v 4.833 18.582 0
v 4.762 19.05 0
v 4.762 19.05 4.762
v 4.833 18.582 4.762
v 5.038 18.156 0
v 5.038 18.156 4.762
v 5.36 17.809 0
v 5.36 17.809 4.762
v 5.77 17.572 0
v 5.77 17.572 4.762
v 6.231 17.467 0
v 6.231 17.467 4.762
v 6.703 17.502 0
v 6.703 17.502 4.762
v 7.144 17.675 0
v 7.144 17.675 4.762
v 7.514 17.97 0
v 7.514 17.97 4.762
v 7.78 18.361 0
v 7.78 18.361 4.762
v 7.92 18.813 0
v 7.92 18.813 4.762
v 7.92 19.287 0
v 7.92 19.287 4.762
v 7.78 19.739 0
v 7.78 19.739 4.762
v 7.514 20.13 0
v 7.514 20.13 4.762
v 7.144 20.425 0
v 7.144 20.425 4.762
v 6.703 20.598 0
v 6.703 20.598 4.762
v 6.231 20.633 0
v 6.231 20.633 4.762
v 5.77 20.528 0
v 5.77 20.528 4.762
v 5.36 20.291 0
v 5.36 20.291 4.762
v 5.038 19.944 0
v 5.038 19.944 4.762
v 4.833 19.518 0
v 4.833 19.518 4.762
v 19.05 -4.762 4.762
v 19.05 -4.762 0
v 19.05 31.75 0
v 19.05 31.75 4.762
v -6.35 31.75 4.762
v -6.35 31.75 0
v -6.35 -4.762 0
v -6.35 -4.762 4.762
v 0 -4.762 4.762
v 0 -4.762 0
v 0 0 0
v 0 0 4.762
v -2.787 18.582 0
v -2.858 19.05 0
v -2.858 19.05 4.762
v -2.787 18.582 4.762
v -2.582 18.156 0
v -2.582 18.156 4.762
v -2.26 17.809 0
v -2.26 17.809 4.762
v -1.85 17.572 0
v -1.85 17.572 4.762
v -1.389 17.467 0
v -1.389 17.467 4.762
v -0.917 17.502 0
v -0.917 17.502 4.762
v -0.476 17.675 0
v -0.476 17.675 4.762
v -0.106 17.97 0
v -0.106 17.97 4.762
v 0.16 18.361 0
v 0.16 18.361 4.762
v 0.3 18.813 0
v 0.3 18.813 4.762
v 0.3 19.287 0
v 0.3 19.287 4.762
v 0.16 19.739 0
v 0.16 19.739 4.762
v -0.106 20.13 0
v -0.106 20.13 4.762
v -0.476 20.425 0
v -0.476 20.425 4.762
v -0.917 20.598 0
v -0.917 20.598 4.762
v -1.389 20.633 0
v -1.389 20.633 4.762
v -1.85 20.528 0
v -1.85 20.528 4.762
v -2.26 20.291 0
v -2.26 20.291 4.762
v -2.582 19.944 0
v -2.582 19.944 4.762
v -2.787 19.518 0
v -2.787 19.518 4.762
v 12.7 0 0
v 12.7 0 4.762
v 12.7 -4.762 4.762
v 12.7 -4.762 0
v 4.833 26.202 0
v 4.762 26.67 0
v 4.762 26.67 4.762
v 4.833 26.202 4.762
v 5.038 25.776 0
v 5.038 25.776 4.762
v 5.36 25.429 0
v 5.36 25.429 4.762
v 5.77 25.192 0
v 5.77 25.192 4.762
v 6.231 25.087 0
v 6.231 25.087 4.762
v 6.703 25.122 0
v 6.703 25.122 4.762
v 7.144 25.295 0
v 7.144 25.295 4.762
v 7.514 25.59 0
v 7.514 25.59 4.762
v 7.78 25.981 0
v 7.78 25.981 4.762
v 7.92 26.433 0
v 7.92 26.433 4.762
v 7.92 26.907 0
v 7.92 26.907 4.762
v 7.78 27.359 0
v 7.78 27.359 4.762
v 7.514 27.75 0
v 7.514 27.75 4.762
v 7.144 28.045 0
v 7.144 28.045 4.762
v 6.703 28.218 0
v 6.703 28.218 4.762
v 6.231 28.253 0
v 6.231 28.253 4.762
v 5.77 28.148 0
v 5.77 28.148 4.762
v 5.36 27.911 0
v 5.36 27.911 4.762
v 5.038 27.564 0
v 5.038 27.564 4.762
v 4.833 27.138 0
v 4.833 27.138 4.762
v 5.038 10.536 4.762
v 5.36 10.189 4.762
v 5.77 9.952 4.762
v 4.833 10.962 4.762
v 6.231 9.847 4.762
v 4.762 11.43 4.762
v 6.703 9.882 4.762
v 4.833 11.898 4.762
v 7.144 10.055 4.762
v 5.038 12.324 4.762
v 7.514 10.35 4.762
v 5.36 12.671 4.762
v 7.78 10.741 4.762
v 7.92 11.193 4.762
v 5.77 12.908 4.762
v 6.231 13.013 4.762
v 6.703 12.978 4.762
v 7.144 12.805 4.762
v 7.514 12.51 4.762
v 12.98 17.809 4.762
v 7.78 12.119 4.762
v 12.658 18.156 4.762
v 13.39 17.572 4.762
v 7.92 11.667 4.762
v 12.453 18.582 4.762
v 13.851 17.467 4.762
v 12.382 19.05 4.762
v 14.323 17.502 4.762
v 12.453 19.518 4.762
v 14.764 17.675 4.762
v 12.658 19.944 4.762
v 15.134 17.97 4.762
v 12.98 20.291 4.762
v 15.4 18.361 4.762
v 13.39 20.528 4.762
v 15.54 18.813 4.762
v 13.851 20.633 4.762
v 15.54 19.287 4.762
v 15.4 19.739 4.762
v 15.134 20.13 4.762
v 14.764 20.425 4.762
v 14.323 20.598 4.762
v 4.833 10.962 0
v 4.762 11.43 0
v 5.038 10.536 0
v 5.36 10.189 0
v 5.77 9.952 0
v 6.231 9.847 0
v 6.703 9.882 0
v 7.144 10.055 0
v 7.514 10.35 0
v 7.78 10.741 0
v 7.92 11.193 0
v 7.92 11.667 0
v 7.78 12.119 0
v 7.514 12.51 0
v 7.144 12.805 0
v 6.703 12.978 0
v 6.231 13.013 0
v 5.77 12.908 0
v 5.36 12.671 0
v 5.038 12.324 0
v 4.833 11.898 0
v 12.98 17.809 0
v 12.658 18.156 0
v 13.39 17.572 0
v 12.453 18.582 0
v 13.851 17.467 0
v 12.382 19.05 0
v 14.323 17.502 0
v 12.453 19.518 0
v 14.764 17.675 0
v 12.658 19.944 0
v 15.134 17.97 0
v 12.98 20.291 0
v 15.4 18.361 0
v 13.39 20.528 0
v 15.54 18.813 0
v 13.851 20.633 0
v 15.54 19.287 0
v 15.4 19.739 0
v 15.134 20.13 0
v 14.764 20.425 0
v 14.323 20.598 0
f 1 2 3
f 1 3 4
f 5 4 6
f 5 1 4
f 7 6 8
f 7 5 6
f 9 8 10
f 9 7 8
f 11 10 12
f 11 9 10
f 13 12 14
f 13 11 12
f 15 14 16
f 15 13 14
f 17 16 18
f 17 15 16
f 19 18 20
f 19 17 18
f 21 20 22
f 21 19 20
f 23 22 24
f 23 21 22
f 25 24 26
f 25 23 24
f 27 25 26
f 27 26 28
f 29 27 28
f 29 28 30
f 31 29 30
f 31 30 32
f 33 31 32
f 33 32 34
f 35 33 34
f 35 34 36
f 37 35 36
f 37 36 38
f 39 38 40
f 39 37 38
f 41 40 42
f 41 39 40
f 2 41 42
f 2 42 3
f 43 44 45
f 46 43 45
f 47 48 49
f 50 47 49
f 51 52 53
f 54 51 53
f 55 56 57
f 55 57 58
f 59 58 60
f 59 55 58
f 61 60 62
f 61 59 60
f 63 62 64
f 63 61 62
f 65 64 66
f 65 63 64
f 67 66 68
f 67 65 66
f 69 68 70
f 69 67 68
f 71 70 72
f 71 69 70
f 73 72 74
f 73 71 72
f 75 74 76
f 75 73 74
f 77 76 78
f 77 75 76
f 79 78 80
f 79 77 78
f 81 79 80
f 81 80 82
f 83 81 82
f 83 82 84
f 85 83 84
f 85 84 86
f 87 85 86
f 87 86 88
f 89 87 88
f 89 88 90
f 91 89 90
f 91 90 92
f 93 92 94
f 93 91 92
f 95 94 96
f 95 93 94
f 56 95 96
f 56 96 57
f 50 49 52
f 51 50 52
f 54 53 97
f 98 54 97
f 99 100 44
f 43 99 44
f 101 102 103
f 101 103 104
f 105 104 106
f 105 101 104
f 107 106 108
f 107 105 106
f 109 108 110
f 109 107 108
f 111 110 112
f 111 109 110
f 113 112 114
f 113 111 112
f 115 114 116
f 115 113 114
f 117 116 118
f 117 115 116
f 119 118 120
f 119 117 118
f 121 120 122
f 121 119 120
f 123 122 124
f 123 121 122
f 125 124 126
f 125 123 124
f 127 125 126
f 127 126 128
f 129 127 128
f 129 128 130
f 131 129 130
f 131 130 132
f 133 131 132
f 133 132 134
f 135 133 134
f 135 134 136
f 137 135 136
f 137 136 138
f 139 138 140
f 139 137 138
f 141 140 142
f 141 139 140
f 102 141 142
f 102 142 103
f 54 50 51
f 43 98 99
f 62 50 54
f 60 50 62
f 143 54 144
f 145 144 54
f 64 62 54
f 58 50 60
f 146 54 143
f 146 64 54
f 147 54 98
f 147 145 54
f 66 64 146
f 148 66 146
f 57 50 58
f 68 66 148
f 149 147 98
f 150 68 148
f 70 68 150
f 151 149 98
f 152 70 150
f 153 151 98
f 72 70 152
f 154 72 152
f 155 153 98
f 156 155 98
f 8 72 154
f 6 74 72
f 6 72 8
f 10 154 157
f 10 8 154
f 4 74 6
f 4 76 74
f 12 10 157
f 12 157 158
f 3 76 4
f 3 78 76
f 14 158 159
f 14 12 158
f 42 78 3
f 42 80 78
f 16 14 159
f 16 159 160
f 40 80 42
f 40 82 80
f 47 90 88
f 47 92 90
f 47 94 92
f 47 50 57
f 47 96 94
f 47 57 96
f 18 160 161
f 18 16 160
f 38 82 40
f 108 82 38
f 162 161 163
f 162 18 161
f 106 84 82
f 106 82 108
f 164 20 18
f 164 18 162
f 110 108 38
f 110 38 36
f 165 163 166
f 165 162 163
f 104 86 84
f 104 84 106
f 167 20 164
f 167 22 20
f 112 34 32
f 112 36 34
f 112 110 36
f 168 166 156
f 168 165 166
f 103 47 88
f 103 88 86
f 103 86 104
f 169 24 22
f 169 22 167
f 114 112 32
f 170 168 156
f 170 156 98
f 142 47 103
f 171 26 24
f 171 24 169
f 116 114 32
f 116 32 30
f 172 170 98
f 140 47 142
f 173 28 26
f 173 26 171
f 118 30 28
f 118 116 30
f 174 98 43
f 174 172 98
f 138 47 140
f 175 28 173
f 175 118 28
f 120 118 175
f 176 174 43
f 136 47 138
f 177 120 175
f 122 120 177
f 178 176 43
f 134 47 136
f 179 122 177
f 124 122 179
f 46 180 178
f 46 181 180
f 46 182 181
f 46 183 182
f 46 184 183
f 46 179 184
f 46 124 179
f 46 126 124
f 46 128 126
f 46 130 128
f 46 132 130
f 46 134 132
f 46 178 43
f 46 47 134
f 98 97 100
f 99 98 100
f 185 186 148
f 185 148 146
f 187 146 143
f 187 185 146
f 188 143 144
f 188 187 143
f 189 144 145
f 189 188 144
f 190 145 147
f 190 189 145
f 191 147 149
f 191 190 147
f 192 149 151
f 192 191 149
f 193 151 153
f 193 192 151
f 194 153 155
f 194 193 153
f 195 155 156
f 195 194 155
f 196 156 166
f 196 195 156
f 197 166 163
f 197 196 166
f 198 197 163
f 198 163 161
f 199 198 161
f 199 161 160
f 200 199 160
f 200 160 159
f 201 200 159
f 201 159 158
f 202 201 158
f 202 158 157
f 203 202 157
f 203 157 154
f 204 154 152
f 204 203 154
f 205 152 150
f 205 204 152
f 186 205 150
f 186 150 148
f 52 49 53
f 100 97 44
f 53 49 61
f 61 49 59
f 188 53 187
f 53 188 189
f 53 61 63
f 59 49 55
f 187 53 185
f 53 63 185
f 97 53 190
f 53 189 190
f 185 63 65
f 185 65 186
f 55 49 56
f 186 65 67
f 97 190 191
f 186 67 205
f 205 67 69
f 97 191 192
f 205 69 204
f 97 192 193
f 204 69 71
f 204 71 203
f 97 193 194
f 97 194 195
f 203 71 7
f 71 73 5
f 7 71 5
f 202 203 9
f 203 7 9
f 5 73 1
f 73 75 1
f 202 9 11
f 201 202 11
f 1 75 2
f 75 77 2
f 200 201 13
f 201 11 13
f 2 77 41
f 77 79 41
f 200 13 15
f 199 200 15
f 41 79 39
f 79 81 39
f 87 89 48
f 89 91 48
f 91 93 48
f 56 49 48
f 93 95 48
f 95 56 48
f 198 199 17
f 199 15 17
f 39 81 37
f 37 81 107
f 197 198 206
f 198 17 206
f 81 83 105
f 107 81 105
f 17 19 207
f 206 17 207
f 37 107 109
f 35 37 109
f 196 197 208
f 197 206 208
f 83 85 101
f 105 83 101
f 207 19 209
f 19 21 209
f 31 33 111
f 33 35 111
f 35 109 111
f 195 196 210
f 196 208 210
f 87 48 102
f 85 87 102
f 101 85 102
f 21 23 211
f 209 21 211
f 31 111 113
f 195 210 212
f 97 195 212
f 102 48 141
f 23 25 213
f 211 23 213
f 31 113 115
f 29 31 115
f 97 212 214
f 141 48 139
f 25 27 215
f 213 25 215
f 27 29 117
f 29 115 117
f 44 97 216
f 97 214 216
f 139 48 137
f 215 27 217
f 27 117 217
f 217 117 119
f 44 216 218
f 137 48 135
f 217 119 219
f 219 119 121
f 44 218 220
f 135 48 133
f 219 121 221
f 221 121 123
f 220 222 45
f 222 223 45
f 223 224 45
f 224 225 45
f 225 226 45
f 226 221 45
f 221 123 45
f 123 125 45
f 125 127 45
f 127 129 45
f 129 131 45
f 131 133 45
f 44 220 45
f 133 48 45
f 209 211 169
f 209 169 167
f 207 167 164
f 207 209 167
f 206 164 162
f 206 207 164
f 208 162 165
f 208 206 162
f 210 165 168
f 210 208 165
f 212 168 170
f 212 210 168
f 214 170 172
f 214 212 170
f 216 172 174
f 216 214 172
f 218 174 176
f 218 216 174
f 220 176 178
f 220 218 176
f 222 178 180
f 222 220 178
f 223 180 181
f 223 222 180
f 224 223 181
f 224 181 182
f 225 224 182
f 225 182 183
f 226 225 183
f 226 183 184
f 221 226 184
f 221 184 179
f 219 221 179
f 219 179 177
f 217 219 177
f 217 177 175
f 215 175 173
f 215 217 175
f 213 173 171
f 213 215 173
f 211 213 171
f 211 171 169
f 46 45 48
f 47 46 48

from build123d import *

# Parameters (mm, degrees)
SKETCH1_R           = 1.5875
BOSS_EXTRUDE1_DEPTH = 4.7625


with BuildPart() as part:
    # Sketch1 → Boss-Extrude1 (new body)
    with BuildSketch(Plane.XY):
        Polygon((0, 0), (12.7, 0), (12.7, -4.7625), (19.05, -4.7625), (19.05, 31.75), (-6.35, 31.75), (-6.35, -4.7625), (0, -4.7625), align=None)
        with Locations(Location((6.35, 19.05, 0), (0, 0, 180))):
            Circle(SKETCH1_R, mode=Mode.SUBTRACT)
        with Locations(Location((6.35, 26.67, 0), (0, 0, 180))):
            Circle(SKETCH1_R, mode=Mode.SUBTRACT)
        with Locations(Location((13.97, 19.05, 0), (0, 0, 180))):
            Circle(SKETCH1_R, mode=Mode.SUBTRACT)
        with Locations(Location((-1.27, 19.05, 0), (0, 0, 180))):
            Circle(SKETCH1_R, mode=Mode.SUBTRACT)
        with Locations(Location((6.35, 11.43, 0), (0, 0, 180))):
            Circle(SKETCH1_R, mode=Mode.SUBTRACT)
    extrude(amount=BOSS_EXTRUDE1_DEPTH)


solid = part.part
